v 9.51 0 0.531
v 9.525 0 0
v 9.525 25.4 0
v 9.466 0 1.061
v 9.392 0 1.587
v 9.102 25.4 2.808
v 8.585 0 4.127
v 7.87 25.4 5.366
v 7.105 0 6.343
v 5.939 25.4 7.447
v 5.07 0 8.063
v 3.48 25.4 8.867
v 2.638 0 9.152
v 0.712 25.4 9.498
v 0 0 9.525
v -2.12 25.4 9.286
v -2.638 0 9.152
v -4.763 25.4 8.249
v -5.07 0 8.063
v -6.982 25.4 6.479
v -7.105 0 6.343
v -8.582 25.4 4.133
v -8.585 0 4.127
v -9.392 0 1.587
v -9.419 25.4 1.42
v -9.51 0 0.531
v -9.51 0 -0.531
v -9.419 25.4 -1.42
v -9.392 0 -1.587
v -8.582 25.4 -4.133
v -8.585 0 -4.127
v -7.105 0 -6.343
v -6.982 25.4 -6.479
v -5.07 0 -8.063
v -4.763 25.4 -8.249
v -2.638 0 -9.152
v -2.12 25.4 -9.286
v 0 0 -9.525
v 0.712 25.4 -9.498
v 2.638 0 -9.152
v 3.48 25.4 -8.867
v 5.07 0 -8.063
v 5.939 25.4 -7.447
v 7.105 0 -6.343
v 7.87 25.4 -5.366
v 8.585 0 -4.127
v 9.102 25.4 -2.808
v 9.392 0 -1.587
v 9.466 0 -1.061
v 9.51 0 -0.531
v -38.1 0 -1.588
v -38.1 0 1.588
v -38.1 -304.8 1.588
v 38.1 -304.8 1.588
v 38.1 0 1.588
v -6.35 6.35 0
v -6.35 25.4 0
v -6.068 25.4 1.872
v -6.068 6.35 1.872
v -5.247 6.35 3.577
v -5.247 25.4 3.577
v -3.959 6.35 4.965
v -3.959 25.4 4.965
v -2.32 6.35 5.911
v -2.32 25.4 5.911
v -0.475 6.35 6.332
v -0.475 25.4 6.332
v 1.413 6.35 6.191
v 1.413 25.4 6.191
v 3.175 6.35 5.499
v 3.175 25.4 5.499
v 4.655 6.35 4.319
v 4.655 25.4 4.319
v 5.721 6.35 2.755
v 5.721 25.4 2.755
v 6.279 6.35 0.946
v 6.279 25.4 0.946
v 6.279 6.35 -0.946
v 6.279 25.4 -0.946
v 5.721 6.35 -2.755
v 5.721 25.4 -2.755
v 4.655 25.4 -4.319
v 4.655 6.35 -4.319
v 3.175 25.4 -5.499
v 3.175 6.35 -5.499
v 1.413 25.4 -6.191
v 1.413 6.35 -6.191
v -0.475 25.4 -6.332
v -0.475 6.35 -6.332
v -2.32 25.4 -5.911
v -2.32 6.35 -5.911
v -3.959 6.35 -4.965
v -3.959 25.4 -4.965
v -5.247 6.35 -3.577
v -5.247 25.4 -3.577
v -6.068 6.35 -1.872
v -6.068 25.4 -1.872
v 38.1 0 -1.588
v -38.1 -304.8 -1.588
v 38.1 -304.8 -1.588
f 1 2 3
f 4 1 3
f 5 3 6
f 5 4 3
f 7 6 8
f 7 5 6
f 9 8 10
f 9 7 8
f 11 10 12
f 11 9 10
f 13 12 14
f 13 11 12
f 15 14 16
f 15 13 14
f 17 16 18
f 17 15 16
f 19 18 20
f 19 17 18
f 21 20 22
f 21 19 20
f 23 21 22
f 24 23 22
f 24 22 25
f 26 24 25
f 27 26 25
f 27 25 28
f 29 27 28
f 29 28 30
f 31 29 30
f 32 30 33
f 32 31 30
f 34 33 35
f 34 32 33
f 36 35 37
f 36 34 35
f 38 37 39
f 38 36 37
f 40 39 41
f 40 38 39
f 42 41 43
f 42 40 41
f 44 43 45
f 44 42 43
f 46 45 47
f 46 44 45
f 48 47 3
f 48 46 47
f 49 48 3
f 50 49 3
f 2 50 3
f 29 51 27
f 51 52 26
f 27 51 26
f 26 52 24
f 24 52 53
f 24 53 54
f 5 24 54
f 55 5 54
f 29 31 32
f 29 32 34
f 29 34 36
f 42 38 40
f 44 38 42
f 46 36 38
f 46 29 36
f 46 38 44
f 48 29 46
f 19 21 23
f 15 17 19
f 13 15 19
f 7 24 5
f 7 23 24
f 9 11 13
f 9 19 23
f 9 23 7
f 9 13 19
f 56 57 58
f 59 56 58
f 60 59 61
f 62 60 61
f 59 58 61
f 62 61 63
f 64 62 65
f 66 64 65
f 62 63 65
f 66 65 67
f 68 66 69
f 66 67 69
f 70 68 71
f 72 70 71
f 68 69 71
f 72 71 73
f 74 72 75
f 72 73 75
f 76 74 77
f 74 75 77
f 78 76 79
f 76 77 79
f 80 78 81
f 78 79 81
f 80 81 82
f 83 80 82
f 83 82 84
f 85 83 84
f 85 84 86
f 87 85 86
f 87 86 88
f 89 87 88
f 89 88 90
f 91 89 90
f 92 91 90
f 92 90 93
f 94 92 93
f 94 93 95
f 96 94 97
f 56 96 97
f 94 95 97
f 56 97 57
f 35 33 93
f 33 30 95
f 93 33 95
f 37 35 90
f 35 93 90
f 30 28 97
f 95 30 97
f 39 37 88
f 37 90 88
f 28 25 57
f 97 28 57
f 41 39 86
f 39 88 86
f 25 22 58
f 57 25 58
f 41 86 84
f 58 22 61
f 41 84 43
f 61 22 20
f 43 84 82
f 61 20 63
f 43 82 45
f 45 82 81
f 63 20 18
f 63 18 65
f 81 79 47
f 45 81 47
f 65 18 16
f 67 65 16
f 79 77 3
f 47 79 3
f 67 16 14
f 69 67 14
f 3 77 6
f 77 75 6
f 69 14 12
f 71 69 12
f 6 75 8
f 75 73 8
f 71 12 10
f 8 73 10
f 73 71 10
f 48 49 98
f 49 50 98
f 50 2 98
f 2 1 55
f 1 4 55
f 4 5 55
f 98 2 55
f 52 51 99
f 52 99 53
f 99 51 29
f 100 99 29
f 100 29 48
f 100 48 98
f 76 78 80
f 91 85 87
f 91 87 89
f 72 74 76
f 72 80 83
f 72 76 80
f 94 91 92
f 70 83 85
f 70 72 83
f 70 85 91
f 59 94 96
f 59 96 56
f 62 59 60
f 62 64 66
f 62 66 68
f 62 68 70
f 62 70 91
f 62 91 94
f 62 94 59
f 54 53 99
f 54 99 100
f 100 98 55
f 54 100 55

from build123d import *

# Parameters (mm, degrees)
F0_R     = 9.525
F1_DEPTH = 25.4
F2_R     = 6.35
F3_DEPTH = 19.05
F4_W     = 76.2
F4_H     = 3.175
F5_DEPTH = 304.8


with BuildPart() as f1:
    # F0 (on Front) → F1 (new body)
    with BuildSketch(Plane.XZ):
        Circle(F0_R)
    extrude(amount=-F1_DEPTH)

    # F2 (on face) → F3 (cut)
    with BuildSketch(Plane(origin=(0, 25.4, 0), x_dir=(-1, 0, 0), z_dir=(0, 1, 0))):
        Circle(F2_R)
    extrude(amount=-F3_DEPTH, mode=Mode.SUBTRACT)

    # F4 (on Front) → F5 (join)
    with BuildSketch(Plane.XZ):
        Rectangle(F4_W, F4_H)
    extrude(amount=F5_DEPTH)


solid = f1.part
